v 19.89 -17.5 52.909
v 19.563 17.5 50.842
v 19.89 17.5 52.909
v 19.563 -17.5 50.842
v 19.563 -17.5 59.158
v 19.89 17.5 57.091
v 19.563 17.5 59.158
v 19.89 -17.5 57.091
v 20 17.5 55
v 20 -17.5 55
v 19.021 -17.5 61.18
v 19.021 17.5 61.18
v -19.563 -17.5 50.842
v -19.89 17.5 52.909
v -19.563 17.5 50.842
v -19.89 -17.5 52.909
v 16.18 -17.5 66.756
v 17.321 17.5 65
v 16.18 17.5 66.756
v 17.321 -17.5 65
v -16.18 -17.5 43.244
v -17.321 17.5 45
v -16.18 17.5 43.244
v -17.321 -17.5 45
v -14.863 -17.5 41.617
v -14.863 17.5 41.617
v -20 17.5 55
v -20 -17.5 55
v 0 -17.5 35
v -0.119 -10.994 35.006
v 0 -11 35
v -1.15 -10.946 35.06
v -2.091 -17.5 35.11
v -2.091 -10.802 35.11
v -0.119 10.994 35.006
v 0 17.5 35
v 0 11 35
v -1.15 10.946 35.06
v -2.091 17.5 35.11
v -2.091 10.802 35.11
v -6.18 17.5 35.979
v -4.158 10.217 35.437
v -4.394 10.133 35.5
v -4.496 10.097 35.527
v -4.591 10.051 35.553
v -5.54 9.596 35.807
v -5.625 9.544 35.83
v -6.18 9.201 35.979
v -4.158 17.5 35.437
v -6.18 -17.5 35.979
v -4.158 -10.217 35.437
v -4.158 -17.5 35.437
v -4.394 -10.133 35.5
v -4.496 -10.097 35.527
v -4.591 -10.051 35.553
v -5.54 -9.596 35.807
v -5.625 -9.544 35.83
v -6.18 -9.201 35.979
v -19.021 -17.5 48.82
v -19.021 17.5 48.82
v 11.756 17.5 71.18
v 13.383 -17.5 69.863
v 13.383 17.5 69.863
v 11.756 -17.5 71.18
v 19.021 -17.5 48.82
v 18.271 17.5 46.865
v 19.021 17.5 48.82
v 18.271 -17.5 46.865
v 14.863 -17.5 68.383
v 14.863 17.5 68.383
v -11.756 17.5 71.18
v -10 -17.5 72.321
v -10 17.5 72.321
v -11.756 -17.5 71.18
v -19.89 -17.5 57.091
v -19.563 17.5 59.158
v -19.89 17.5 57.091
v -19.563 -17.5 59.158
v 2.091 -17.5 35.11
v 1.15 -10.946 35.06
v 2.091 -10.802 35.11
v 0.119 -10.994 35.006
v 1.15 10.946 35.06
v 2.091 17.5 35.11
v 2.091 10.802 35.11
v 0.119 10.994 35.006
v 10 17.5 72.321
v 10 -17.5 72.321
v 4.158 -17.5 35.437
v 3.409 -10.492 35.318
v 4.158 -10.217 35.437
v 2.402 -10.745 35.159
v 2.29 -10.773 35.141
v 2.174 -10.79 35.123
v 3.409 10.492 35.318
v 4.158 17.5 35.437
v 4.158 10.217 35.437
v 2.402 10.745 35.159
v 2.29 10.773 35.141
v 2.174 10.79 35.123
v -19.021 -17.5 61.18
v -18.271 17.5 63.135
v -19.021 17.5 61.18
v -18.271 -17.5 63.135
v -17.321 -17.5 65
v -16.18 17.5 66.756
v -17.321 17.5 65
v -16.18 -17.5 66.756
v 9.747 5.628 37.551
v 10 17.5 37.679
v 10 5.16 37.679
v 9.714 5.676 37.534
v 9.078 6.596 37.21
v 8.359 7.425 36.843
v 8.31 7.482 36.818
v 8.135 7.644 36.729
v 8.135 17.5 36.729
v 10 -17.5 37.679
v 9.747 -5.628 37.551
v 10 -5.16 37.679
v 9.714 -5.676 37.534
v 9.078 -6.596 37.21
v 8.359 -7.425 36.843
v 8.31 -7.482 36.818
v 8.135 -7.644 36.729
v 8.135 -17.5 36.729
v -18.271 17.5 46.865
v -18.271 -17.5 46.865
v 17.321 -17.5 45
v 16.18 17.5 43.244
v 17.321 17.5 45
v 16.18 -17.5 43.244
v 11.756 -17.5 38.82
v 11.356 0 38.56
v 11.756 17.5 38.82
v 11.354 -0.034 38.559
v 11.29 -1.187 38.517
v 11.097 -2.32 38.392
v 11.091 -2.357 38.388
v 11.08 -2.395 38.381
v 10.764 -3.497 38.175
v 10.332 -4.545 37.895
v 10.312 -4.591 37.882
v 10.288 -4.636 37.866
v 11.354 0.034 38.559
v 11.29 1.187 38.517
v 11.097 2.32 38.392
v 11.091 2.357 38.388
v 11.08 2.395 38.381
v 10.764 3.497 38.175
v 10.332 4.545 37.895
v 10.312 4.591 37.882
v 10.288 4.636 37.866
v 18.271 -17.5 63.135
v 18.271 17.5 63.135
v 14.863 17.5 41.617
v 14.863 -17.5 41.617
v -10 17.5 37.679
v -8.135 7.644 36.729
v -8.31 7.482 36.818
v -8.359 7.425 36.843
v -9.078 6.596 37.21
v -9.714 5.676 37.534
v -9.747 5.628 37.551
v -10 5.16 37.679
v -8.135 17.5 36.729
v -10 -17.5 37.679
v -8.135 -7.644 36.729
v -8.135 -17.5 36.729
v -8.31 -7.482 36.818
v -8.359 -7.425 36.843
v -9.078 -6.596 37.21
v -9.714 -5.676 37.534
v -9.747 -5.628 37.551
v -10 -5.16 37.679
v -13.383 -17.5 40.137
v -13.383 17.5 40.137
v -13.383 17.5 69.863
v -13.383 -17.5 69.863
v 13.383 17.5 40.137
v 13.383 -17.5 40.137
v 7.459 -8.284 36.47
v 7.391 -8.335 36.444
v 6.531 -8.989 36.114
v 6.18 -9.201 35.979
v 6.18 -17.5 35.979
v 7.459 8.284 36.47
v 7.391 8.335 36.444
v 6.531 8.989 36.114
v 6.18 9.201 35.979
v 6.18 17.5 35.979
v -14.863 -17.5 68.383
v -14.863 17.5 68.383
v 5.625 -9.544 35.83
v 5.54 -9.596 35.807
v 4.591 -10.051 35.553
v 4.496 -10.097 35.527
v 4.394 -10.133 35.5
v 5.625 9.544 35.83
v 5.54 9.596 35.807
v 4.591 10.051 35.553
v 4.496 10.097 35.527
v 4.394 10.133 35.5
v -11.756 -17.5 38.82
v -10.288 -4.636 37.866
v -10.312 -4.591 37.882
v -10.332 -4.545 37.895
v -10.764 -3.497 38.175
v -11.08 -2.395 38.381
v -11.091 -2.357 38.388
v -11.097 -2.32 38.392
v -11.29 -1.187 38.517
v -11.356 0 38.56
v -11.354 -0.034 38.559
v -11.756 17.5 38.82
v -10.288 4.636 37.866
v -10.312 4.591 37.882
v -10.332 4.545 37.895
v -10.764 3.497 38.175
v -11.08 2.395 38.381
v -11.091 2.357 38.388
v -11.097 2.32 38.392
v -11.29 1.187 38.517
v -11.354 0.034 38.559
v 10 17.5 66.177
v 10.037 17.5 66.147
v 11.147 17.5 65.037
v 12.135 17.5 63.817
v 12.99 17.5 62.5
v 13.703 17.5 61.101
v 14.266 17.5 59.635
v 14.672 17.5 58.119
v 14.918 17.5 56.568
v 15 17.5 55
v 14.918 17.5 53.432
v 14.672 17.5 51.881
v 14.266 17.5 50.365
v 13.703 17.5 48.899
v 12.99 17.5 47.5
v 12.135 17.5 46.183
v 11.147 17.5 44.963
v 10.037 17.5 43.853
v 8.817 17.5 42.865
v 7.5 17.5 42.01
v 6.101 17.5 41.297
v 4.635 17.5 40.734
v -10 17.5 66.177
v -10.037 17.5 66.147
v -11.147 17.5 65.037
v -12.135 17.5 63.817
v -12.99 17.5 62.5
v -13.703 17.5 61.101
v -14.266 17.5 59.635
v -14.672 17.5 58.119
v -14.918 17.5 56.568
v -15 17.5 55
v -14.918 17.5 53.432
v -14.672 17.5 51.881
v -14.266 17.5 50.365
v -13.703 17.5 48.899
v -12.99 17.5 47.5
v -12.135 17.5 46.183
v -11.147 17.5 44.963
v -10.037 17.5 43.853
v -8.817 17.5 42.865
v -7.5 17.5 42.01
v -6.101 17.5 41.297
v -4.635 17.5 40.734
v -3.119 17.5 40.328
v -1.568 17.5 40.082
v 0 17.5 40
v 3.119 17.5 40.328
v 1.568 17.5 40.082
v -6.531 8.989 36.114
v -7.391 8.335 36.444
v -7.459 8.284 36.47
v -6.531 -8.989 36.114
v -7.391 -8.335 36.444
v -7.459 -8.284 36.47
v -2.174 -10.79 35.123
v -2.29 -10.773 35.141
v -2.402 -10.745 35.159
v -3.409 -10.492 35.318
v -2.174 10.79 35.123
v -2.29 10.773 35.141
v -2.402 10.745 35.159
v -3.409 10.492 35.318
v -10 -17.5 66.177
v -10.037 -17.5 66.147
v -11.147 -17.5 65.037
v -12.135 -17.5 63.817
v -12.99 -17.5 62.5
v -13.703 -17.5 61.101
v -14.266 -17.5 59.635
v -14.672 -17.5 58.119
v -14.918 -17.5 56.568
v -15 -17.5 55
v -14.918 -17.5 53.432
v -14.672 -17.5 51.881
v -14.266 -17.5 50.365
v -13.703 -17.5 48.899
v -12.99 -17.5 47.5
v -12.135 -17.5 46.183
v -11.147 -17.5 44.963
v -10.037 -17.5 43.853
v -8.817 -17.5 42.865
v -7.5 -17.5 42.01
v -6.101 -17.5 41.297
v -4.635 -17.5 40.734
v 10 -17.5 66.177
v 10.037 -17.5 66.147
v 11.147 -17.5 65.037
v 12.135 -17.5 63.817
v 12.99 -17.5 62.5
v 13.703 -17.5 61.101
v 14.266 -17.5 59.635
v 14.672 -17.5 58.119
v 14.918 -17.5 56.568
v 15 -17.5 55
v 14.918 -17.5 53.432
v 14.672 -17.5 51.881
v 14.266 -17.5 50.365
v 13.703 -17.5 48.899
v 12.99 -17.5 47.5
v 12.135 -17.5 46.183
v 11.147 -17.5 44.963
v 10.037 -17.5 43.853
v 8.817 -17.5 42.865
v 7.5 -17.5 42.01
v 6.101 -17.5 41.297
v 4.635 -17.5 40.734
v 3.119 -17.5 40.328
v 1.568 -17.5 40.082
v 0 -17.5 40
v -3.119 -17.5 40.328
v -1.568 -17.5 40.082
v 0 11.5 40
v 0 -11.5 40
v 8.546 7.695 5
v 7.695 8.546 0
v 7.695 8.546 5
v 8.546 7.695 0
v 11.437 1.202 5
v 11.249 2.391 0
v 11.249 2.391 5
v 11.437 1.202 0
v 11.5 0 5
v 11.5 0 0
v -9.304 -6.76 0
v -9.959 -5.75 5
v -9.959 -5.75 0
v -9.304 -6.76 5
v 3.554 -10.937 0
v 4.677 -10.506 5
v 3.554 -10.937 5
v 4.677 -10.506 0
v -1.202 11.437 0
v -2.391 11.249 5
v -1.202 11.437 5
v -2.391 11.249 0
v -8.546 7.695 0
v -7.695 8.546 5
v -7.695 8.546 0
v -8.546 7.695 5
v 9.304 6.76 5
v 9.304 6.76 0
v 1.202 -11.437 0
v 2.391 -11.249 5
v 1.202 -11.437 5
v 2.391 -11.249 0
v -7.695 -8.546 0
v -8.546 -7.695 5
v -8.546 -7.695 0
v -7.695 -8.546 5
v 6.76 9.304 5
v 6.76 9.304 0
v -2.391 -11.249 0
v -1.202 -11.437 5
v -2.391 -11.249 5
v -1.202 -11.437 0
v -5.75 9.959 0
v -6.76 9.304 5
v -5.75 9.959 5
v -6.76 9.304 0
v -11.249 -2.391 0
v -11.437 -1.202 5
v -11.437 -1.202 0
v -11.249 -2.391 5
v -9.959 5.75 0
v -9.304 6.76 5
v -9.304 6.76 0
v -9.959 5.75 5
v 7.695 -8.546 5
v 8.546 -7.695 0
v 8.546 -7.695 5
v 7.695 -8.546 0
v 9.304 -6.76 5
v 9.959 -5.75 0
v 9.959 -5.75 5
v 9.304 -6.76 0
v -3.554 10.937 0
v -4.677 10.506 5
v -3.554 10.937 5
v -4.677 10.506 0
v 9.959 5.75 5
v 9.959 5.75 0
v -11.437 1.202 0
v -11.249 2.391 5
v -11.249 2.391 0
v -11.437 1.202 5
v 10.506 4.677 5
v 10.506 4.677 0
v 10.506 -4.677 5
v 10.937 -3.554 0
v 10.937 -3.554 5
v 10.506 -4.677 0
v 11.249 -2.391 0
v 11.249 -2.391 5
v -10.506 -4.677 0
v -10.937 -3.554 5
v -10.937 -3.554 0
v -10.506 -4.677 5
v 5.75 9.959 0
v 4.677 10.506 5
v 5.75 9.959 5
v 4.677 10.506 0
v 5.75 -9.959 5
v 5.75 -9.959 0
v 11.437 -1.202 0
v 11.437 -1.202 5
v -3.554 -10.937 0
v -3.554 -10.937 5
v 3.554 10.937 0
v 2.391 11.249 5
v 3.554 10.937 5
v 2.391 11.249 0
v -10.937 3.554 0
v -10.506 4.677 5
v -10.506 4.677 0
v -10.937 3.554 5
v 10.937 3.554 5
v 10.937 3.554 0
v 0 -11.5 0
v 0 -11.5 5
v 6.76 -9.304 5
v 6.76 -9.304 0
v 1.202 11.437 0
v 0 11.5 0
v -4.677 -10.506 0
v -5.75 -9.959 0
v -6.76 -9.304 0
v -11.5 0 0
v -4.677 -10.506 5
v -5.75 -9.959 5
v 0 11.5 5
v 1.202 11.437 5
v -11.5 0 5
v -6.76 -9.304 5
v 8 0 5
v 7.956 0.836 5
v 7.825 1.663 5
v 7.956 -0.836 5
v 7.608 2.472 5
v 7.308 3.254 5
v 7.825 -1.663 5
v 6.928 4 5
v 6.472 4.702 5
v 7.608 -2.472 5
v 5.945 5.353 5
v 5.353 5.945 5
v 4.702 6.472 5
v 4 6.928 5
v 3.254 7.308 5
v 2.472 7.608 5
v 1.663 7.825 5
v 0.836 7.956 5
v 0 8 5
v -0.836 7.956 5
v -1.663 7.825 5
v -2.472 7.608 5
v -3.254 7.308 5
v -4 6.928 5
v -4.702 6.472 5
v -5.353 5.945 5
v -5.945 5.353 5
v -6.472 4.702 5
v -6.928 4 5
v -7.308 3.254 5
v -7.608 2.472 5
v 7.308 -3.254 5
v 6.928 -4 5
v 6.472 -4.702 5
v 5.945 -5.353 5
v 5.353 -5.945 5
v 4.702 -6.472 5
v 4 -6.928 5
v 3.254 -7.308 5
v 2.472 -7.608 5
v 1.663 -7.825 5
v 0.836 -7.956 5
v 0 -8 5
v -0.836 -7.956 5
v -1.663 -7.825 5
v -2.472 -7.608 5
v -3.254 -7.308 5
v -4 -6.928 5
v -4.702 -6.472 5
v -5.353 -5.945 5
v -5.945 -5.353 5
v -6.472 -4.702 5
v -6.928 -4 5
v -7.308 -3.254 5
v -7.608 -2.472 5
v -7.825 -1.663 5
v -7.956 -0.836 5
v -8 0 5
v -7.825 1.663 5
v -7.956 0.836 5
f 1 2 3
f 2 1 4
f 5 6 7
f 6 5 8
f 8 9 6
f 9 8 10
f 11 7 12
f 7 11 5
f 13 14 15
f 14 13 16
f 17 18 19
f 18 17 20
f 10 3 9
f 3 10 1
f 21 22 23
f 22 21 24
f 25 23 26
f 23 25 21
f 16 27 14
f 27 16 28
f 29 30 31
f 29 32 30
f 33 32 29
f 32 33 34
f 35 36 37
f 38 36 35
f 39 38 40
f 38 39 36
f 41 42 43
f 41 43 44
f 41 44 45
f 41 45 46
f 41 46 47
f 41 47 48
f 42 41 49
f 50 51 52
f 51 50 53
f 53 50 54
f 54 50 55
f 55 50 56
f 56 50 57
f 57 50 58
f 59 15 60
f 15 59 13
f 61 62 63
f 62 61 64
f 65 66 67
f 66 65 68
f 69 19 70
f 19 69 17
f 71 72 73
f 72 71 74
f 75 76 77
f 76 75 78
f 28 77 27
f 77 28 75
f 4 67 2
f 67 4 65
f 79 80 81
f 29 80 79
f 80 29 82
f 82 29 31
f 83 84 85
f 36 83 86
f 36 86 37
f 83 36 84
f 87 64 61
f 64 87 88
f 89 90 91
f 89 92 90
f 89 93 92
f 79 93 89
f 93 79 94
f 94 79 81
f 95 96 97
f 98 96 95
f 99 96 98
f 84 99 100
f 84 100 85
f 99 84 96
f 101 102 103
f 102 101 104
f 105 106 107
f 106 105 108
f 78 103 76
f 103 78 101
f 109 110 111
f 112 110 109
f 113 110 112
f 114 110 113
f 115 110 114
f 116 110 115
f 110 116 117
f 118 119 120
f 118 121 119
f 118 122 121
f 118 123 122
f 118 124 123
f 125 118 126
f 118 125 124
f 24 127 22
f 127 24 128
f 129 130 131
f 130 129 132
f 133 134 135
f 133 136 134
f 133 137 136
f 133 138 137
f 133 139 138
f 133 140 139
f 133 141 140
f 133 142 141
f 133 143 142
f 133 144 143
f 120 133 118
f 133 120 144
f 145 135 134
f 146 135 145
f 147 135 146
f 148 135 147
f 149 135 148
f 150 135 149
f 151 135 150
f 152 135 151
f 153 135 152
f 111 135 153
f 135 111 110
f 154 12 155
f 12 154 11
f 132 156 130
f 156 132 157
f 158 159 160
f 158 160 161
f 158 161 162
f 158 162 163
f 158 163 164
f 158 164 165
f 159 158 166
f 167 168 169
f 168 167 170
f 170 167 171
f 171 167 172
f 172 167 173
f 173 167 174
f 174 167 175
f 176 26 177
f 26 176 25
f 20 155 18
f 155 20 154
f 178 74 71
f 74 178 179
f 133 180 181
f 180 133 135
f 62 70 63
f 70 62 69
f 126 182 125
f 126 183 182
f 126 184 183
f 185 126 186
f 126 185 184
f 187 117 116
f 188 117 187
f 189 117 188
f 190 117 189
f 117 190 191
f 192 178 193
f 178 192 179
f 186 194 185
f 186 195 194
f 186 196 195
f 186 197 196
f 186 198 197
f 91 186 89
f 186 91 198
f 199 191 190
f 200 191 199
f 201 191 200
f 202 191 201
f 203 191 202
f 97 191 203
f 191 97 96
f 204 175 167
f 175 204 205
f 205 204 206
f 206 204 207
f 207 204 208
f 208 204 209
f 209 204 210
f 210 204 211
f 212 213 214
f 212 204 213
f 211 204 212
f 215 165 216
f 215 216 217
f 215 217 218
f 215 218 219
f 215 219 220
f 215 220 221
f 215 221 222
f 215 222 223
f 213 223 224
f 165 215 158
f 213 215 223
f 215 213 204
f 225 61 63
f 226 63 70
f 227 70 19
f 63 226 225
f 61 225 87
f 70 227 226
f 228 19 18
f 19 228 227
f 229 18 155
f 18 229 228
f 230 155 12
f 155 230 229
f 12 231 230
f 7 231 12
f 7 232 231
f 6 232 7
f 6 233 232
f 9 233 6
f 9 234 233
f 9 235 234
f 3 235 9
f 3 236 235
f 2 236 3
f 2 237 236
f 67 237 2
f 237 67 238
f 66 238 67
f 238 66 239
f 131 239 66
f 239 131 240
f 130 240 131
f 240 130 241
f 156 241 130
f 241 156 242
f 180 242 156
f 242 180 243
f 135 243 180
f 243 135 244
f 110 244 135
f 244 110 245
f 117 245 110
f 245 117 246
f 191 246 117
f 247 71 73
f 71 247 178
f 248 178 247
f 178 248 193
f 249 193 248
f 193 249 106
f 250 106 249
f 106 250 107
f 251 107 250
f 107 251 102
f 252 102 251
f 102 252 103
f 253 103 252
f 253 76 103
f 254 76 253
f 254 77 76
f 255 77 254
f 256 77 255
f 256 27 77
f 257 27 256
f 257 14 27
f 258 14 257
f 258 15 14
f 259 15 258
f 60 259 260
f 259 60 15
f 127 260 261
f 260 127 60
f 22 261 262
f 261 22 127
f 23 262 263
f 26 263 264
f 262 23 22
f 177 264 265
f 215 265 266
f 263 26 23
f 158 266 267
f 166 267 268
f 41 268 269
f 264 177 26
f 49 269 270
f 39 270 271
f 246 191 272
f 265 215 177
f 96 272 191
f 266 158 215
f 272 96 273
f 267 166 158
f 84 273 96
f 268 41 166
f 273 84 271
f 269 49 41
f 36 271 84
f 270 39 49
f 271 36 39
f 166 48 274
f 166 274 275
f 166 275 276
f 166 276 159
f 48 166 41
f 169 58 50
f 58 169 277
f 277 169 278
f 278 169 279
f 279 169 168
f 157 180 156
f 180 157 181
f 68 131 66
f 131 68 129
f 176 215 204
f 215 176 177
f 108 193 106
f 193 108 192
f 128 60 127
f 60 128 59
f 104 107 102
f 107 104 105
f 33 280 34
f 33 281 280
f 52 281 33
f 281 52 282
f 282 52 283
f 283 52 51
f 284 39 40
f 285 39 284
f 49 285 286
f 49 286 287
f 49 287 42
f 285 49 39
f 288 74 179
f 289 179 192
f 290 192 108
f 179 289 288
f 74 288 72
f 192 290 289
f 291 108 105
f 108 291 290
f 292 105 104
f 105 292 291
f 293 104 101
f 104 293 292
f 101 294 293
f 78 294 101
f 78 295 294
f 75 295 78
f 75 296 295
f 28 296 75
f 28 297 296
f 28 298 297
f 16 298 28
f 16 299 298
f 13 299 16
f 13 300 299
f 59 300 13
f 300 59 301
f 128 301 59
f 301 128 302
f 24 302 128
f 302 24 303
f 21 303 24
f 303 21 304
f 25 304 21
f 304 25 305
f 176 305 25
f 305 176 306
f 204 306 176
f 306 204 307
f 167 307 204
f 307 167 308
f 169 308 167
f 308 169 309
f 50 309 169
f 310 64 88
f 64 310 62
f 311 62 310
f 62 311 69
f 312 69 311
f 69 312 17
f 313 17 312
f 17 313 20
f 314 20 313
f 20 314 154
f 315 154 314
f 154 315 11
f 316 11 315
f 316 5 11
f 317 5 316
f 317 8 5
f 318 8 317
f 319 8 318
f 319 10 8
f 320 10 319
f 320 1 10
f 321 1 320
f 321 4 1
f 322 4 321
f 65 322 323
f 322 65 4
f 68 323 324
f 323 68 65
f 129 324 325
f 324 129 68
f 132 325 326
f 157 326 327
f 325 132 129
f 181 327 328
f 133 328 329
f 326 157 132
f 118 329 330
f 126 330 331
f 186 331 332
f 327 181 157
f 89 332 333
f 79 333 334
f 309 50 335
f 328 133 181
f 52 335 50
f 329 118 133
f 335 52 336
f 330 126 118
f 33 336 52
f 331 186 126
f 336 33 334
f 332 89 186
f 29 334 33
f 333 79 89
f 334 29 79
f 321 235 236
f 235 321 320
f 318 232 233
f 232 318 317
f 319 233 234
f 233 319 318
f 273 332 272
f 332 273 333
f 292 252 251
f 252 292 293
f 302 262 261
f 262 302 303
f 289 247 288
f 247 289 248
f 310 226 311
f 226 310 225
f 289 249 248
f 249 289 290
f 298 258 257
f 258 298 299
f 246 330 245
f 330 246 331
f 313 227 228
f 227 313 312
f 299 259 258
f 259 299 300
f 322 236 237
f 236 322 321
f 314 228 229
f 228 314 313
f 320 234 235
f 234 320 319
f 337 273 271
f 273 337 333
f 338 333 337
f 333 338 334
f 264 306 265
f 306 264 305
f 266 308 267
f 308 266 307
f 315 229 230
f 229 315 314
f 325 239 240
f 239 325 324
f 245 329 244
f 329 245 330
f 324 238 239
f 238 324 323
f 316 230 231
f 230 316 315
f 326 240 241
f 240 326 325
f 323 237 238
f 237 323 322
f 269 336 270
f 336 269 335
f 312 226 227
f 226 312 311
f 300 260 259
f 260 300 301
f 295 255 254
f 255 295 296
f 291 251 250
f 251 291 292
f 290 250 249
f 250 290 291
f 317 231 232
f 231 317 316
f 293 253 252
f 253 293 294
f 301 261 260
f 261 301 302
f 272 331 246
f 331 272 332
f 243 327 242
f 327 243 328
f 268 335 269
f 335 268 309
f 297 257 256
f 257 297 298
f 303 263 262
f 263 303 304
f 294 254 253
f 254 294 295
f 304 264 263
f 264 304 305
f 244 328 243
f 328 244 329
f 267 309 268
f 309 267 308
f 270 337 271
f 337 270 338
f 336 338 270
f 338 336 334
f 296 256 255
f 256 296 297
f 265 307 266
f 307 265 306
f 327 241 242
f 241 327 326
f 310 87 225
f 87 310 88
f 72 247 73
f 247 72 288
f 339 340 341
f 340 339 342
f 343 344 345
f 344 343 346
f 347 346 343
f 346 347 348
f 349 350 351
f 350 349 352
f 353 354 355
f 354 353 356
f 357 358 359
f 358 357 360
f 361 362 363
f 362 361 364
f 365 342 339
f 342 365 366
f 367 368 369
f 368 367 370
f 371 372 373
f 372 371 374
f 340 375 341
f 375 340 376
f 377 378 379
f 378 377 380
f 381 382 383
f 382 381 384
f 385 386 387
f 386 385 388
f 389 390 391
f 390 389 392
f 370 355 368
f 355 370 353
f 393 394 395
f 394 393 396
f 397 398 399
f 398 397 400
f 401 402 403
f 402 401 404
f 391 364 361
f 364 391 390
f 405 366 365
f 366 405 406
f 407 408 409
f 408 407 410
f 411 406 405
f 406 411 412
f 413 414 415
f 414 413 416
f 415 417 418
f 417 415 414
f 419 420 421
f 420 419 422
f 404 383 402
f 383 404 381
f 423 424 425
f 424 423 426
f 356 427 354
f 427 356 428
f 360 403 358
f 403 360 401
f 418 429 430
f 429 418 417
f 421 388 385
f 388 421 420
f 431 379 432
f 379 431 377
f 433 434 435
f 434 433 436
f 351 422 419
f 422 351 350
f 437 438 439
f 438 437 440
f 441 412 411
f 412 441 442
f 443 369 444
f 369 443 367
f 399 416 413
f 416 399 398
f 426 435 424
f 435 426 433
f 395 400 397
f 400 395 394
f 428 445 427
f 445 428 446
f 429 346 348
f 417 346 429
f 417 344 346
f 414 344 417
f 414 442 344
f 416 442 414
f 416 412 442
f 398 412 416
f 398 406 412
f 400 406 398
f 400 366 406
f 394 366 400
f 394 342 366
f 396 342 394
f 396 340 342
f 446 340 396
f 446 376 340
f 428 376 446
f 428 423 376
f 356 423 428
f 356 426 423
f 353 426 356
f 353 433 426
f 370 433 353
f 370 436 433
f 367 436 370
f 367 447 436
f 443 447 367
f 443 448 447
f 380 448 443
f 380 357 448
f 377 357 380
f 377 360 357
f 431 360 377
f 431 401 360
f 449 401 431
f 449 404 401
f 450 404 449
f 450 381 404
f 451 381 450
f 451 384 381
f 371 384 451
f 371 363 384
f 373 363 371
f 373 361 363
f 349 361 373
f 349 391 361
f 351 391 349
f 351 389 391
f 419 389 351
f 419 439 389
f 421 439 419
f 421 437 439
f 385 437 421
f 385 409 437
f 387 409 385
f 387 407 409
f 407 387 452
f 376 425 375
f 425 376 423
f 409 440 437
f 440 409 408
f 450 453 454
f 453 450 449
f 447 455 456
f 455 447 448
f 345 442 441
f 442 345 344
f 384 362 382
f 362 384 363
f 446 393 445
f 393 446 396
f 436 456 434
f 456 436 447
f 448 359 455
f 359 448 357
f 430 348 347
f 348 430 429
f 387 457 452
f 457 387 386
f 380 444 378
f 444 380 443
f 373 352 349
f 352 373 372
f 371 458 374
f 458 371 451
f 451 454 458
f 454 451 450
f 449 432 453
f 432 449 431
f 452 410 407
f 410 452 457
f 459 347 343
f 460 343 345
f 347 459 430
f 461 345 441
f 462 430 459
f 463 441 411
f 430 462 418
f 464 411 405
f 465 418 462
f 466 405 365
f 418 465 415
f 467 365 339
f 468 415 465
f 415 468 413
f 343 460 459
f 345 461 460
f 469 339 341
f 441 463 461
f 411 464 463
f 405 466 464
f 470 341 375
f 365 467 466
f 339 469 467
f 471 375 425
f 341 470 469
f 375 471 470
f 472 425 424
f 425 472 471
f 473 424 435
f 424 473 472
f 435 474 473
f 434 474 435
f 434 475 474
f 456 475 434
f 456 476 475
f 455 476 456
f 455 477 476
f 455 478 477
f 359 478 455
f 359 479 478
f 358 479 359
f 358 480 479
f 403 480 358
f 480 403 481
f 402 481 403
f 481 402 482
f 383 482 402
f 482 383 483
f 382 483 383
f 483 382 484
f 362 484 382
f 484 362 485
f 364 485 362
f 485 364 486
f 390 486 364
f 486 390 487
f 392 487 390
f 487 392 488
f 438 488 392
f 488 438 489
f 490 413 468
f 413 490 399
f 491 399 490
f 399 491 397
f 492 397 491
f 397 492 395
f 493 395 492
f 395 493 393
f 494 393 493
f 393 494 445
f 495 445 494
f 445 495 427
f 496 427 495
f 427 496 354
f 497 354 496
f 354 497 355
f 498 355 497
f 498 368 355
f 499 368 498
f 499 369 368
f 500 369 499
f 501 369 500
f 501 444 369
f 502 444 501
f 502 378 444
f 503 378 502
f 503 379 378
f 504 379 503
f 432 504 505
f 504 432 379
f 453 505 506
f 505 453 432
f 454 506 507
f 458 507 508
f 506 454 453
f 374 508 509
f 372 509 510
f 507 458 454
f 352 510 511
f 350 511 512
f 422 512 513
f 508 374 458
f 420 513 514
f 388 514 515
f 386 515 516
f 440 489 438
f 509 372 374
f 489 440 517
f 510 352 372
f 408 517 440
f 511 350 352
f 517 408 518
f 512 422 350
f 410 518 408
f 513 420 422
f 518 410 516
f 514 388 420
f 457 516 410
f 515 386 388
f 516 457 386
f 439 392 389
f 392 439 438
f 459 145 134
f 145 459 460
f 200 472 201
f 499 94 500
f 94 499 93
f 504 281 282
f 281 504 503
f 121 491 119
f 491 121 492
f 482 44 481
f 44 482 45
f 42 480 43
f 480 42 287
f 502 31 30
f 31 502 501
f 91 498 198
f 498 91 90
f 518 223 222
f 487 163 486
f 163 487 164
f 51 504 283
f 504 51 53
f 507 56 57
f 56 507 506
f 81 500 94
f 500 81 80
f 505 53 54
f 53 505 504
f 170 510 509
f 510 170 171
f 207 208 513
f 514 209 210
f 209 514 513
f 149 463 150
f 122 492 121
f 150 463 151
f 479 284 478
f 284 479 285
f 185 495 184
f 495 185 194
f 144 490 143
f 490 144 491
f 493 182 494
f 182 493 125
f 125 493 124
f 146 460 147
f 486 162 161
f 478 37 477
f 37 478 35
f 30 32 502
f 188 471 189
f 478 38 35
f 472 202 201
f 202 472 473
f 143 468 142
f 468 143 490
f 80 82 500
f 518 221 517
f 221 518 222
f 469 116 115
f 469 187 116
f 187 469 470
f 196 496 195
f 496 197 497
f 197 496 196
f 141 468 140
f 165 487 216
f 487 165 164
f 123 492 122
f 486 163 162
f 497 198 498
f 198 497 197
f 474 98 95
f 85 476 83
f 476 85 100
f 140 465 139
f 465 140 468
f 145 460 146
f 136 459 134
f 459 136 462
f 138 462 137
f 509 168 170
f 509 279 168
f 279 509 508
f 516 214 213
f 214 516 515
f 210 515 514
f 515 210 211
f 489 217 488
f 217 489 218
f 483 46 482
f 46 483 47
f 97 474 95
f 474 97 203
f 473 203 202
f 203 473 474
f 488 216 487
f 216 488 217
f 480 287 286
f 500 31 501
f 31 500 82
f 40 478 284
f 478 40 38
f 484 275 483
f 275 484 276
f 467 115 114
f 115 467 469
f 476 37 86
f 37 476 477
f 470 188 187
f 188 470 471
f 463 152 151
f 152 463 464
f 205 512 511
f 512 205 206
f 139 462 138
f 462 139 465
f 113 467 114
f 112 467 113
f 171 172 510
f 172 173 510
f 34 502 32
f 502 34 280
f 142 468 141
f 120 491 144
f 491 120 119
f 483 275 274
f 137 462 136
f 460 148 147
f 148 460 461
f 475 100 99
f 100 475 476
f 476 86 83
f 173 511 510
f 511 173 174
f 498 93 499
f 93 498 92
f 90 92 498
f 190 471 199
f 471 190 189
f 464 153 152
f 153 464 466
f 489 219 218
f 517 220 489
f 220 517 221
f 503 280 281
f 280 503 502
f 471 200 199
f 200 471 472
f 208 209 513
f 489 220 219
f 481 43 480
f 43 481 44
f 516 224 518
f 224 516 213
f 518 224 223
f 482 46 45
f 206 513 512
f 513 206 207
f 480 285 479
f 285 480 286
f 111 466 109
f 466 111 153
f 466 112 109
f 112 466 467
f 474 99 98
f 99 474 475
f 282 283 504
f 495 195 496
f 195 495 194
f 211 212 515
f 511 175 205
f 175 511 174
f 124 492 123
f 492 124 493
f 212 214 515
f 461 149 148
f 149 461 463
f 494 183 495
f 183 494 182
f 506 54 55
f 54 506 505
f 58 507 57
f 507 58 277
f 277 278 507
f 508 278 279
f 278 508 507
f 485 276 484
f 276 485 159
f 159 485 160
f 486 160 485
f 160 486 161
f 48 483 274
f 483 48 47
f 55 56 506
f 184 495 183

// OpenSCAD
$fn=60;
h = 35;
r_s = 16/2;
r_b = 23/2;
r_m = 30/2;
t = 5;

cylinder(h=t,r=r_b);
translate([0,0,t])
cylinder(h=h,r1=r_s,r2=r_b);

translate([0,h/2,t+h+r_m])
rotate(a=[90,0,0])
difference(){
	cylinder(h=h,r=r_m+t);
	cylinder(h=h,r=r_m);
	translate([-2*t,r_m-t,0])
	cube([4*t,r_m,h]);
}
